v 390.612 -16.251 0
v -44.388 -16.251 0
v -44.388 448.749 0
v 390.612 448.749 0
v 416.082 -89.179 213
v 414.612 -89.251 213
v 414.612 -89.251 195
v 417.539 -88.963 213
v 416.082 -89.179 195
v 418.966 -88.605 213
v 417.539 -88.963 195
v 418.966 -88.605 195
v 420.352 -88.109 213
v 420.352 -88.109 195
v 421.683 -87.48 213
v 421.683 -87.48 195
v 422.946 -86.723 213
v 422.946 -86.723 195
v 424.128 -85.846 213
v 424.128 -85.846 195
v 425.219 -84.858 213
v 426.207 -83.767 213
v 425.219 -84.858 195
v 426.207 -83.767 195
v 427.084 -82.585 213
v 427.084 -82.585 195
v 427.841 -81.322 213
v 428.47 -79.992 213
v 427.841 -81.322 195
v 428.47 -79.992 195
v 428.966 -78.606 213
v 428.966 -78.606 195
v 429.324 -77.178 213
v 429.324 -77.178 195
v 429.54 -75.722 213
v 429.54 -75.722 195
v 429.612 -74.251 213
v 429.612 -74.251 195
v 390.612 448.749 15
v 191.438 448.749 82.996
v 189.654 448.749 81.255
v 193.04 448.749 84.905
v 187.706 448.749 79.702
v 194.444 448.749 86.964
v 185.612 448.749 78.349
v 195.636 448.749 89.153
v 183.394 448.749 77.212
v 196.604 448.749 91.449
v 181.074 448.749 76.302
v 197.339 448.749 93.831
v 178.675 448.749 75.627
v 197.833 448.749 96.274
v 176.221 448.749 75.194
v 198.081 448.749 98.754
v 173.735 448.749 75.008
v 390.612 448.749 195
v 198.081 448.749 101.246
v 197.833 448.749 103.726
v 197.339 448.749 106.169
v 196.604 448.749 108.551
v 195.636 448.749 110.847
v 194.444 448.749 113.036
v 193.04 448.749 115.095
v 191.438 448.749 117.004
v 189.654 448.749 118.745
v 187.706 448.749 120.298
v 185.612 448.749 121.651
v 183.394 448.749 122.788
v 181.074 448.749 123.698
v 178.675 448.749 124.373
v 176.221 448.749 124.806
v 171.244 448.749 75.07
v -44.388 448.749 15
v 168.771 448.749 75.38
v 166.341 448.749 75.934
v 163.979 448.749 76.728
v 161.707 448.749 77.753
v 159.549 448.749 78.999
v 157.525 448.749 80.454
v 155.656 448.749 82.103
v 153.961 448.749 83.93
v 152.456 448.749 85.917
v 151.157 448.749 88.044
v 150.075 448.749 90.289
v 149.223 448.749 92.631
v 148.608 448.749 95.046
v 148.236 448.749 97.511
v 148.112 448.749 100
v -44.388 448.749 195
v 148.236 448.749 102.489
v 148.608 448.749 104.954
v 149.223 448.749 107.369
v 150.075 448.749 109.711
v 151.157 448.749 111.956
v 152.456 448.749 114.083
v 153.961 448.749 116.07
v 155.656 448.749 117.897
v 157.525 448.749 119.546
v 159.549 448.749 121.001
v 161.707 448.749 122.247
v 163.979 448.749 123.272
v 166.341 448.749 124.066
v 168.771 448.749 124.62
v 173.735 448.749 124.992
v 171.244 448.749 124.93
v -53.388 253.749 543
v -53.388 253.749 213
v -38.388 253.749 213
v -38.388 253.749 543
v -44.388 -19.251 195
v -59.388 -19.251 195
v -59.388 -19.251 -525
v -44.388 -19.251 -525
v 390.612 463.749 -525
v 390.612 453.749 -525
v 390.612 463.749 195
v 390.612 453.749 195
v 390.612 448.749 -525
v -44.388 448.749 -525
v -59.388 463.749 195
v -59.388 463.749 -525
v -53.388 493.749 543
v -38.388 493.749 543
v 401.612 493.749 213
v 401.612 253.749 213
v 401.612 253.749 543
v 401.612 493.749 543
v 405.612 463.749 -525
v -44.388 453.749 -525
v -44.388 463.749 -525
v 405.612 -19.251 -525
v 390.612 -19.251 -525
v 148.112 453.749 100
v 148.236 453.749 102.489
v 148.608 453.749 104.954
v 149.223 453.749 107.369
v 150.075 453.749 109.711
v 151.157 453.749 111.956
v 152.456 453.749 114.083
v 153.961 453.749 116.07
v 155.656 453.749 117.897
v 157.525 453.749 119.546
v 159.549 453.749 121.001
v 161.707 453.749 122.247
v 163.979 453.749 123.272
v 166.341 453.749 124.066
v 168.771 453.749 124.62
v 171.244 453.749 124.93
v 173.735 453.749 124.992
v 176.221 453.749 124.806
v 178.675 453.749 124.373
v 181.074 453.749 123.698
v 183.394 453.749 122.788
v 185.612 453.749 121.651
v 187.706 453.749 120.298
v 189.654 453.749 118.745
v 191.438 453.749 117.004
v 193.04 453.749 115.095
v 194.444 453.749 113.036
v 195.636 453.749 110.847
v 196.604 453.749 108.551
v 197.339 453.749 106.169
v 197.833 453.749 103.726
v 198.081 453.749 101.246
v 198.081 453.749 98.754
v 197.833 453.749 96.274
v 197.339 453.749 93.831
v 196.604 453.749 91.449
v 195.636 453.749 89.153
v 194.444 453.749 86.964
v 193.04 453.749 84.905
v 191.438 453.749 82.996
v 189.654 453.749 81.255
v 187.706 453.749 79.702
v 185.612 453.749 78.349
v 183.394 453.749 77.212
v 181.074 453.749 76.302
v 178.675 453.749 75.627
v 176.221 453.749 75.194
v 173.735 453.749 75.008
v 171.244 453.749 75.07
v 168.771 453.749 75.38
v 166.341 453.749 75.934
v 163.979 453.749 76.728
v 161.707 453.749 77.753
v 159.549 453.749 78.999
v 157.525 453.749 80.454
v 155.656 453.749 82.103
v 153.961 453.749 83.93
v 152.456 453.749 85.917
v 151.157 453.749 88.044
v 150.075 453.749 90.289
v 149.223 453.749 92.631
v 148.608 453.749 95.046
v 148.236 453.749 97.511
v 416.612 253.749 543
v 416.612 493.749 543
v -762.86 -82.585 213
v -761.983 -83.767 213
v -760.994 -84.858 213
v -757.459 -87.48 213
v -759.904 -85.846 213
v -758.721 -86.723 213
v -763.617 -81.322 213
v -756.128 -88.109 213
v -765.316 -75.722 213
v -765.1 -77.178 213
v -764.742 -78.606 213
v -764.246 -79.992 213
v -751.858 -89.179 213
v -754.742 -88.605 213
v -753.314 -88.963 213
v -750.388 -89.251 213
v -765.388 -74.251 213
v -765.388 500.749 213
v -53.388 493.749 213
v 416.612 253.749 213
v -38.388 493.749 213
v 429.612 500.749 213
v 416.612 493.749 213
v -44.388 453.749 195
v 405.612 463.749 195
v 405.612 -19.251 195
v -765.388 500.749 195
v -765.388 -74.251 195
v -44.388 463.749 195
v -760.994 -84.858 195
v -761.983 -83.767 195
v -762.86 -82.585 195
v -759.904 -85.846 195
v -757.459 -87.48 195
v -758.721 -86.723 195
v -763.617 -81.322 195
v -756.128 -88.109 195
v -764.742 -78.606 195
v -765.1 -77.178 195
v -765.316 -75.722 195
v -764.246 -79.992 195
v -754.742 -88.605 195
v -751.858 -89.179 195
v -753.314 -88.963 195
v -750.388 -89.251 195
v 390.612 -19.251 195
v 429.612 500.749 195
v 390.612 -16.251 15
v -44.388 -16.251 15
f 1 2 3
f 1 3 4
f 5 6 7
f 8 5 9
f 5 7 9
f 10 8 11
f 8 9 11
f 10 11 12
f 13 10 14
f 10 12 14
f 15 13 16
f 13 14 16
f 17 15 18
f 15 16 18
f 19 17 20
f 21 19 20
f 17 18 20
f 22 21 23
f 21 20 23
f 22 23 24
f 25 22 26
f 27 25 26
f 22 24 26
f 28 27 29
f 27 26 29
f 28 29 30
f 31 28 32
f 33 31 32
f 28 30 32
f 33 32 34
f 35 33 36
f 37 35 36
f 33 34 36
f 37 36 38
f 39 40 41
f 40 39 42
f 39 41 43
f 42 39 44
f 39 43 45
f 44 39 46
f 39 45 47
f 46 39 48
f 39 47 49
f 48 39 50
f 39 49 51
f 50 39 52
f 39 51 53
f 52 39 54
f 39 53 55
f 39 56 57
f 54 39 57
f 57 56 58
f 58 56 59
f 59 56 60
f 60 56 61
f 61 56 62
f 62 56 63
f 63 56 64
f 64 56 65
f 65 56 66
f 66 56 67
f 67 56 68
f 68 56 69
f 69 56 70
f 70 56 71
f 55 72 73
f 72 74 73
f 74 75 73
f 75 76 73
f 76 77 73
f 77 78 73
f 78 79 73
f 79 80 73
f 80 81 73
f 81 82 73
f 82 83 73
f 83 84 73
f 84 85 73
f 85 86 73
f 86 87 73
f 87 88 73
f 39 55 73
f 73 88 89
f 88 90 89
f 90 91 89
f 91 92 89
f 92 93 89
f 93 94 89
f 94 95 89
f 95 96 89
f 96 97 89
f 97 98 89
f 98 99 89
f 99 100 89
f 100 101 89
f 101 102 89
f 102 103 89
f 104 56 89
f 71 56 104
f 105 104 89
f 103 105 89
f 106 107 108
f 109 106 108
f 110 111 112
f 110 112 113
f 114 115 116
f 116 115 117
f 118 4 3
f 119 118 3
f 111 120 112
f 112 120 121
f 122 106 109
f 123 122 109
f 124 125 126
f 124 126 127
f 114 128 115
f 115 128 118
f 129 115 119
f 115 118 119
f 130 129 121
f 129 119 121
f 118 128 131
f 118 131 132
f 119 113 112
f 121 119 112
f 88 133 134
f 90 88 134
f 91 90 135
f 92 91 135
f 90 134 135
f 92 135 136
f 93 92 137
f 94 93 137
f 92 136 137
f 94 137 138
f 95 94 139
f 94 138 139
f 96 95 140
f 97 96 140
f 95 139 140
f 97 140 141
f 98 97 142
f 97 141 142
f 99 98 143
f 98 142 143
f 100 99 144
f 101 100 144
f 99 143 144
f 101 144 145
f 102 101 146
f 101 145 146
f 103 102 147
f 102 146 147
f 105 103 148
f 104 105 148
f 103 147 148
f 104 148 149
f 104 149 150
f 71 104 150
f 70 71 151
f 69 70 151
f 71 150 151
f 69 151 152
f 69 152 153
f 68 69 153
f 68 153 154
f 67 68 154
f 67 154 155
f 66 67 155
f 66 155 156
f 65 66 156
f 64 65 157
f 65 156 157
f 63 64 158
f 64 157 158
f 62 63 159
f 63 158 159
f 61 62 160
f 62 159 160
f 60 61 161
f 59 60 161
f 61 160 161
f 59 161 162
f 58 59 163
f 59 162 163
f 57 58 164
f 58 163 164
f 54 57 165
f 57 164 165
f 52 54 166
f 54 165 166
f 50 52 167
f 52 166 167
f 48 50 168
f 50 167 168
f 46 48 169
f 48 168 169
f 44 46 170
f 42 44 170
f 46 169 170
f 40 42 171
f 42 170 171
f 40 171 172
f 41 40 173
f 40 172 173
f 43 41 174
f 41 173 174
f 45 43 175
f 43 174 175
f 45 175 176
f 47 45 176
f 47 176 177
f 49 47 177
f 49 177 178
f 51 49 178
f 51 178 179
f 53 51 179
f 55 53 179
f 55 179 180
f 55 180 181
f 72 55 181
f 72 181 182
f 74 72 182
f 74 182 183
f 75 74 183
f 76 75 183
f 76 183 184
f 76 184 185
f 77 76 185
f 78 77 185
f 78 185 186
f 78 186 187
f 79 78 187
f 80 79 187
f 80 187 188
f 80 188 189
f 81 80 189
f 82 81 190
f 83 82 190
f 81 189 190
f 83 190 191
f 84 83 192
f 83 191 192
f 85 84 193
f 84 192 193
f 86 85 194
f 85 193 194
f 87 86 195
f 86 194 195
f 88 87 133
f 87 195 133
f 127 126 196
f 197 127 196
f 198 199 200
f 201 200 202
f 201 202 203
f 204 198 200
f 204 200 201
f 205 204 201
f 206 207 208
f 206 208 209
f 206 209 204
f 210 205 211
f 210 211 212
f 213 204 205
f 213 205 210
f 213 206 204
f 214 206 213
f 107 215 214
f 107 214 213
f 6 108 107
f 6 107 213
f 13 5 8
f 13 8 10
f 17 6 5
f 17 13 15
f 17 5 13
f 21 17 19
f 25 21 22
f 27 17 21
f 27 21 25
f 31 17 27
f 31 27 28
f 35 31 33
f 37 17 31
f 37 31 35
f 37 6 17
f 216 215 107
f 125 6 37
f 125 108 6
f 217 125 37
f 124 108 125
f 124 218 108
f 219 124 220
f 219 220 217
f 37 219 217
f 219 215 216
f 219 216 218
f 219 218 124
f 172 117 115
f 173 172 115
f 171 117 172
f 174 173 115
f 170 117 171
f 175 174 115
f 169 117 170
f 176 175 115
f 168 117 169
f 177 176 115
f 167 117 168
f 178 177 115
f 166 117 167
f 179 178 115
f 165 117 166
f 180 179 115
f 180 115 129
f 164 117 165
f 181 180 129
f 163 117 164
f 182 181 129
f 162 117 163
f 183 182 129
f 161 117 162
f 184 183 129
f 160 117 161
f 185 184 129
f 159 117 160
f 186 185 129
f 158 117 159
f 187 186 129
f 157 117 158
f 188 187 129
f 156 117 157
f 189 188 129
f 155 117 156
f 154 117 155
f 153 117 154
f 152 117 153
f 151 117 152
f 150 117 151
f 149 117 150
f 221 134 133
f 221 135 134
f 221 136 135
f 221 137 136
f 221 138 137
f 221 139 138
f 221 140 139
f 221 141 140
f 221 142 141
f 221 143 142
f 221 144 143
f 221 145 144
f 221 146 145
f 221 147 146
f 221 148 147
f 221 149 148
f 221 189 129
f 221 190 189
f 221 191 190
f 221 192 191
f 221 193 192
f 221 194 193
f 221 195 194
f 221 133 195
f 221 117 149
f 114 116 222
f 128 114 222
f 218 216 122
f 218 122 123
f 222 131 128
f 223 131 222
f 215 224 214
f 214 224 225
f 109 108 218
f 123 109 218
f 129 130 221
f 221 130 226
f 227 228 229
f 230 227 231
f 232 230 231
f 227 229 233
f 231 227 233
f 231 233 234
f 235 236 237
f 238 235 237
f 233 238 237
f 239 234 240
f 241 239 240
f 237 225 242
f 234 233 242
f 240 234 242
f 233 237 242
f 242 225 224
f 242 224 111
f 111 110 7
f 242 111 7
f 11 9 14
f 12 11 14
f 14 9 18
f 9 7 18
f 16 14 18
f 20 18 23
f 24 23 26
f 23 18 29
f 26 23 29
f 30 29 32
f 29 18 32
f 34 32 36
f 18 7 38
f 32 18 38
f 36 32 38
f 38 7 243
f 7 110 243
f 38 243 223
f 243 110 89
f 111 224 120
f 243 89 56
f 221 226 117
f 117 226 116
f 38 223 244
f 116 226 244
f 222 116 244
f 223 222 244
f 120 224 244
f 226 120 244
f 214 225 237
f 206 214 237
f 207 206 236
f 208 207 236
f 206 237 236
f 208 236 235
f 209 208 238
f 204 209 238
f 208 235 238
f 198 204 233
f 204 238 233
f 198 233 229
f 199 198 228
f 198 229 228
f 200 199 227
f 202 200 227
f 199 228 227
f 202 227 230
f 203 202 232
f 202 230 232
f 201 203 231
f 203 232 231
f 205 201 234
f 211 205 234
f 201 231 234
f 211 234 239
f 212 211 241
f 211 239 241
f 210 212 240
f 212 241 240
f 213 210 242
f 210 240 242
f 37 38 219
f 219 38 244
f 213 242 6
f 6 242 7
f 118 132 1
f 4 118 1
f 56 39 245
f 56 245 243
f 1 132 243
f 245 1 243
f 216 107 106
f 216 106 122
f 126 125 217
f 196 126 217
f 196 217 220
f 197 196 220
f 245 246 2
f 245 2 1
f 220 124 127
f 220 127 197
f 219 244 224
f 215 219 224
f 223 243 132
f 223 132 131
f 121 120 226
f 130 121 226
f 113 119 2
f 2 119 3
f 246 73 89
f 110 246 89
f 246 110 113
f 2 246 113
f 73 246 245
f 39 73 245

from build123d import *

# Parameters (mm, degrees)
F0_W      = 435
F0_H      = 465
F1_DEPTH  = 15
F3_DEPTH  = 480
F4_DEPTH  = 3
F5_W      = 15
F5_H      = 720
F6_DEPTH  = 483
F8_DEPTH  = 5
F9_R      = 25
F10_DEPTH = 5
F12_DEPTH = 18
F13_W     = 15
F13_H     = 240
F14_DEPTH = 330
F15_W     = 15
F15_H     = 240
F16_DEPTH = 330


with BuildPart() as f1:
    # F0 (on Top) → F1 (new body)
    with BuildSketch(Plane.XY):
        with Locations((173.112164, 216.248717)):
            Rectangle(F0_W, F0_H)
    extrude(amount=F1_DEPTH)

    # F2 (on face) → F3 (join)
    with BuildSketch(Plane.XZ.offset(16.251283)):
        Polygon((-59.387836, 195), (-59.387836, 0), (-59.387836, -525), (-44.387836, -525), (-44.387836, 195), align=None)
    extrude(amount=-F3_DEPTH)

    # F2 (on face) → F4 (join)
    with BuildSketch(Plane.XZ.offset(16.251283)):
        Polygon((-59.387836, 195), (-59.387836, 0), (-59.387836, -525), (-44.387836, -525), (-44.387836, 195), align=None)
    extrude(amount=F4_DEPTH)

    # F5 (on face) → F6 (join)
    with BuildSketch(Plane.XZ.offset(19.251283)):
        with Locations((398.112164, -165)):
            Rectangle(F5_W, F5_H)
    extrude(amount=-F6_DEPTH)

    # F7 (on face) → F8 (join)
    with BuildSketch(Plane(origin=(0, 448.748717, 0), x_dir=(-1, 0, 0), z_dir=(0, 1, 0))):
        Polygon((-390.612164, 195), (-390.612164, 15), (-390.612164, -525), (44.387836, -525), (44.387836, 195), align=None)
    extrude(amount=F8_DEPTH)

    # F9 (on face) → F10 (cut)
    with BuildSketch(Plane(origin=(0, 453.748717, 0), x_dir=(-1, 0, 0), z_dir=(0, 1, 0))):
        with Locations((-173.112164, 100)):
            Circle(F9_R)
    extrude(amount=-F10_DEPTH, mode=Mode.SUBTRACT)

    # F11 (on face) → F12 (join)
    with BuildSketch(Plane.XY.offset(195)):
        with BuildLine():
            Line((-750.387836, -89.251283), (414.612164, -89.251283))
            ThreePointArc((414.612164, -89.251283), (425.218766, -84.857884), (429.612164, -74.251283))
            Line((429.612164, -74.251283), (429.612164, 500.748717))
            Line((429.612164, 500.748717), (-765.387836, 500.748717))
            Line((-765.387836, 500.748717), (-765.387836, -74.251283))
            ThreePointArc((-765.387836, -74.251283), (-760.994438, -84.857884), (-750.387836, -89.251283))
        make_face()
    extrude(amount=F12_DEPTH)

    # F13 (on face) → F14 (join)
    with BuildSketch(Plane.XY.offset(213)):
        with Locations((409.112164, 373.748717)):
            Rectangle(F13_W, F13_H)
    extrude(amount=F14_DEPTH)

    # F15 (on face) → F16 (join)
    with BuildSketch(Plane.XY.offset(213)):
        with Locations((-45.887836, 373.748717)):
            Rectangle(F15_W, F15_H)
    extrude(amount=F16_DEPTH)


solid = f1.part
